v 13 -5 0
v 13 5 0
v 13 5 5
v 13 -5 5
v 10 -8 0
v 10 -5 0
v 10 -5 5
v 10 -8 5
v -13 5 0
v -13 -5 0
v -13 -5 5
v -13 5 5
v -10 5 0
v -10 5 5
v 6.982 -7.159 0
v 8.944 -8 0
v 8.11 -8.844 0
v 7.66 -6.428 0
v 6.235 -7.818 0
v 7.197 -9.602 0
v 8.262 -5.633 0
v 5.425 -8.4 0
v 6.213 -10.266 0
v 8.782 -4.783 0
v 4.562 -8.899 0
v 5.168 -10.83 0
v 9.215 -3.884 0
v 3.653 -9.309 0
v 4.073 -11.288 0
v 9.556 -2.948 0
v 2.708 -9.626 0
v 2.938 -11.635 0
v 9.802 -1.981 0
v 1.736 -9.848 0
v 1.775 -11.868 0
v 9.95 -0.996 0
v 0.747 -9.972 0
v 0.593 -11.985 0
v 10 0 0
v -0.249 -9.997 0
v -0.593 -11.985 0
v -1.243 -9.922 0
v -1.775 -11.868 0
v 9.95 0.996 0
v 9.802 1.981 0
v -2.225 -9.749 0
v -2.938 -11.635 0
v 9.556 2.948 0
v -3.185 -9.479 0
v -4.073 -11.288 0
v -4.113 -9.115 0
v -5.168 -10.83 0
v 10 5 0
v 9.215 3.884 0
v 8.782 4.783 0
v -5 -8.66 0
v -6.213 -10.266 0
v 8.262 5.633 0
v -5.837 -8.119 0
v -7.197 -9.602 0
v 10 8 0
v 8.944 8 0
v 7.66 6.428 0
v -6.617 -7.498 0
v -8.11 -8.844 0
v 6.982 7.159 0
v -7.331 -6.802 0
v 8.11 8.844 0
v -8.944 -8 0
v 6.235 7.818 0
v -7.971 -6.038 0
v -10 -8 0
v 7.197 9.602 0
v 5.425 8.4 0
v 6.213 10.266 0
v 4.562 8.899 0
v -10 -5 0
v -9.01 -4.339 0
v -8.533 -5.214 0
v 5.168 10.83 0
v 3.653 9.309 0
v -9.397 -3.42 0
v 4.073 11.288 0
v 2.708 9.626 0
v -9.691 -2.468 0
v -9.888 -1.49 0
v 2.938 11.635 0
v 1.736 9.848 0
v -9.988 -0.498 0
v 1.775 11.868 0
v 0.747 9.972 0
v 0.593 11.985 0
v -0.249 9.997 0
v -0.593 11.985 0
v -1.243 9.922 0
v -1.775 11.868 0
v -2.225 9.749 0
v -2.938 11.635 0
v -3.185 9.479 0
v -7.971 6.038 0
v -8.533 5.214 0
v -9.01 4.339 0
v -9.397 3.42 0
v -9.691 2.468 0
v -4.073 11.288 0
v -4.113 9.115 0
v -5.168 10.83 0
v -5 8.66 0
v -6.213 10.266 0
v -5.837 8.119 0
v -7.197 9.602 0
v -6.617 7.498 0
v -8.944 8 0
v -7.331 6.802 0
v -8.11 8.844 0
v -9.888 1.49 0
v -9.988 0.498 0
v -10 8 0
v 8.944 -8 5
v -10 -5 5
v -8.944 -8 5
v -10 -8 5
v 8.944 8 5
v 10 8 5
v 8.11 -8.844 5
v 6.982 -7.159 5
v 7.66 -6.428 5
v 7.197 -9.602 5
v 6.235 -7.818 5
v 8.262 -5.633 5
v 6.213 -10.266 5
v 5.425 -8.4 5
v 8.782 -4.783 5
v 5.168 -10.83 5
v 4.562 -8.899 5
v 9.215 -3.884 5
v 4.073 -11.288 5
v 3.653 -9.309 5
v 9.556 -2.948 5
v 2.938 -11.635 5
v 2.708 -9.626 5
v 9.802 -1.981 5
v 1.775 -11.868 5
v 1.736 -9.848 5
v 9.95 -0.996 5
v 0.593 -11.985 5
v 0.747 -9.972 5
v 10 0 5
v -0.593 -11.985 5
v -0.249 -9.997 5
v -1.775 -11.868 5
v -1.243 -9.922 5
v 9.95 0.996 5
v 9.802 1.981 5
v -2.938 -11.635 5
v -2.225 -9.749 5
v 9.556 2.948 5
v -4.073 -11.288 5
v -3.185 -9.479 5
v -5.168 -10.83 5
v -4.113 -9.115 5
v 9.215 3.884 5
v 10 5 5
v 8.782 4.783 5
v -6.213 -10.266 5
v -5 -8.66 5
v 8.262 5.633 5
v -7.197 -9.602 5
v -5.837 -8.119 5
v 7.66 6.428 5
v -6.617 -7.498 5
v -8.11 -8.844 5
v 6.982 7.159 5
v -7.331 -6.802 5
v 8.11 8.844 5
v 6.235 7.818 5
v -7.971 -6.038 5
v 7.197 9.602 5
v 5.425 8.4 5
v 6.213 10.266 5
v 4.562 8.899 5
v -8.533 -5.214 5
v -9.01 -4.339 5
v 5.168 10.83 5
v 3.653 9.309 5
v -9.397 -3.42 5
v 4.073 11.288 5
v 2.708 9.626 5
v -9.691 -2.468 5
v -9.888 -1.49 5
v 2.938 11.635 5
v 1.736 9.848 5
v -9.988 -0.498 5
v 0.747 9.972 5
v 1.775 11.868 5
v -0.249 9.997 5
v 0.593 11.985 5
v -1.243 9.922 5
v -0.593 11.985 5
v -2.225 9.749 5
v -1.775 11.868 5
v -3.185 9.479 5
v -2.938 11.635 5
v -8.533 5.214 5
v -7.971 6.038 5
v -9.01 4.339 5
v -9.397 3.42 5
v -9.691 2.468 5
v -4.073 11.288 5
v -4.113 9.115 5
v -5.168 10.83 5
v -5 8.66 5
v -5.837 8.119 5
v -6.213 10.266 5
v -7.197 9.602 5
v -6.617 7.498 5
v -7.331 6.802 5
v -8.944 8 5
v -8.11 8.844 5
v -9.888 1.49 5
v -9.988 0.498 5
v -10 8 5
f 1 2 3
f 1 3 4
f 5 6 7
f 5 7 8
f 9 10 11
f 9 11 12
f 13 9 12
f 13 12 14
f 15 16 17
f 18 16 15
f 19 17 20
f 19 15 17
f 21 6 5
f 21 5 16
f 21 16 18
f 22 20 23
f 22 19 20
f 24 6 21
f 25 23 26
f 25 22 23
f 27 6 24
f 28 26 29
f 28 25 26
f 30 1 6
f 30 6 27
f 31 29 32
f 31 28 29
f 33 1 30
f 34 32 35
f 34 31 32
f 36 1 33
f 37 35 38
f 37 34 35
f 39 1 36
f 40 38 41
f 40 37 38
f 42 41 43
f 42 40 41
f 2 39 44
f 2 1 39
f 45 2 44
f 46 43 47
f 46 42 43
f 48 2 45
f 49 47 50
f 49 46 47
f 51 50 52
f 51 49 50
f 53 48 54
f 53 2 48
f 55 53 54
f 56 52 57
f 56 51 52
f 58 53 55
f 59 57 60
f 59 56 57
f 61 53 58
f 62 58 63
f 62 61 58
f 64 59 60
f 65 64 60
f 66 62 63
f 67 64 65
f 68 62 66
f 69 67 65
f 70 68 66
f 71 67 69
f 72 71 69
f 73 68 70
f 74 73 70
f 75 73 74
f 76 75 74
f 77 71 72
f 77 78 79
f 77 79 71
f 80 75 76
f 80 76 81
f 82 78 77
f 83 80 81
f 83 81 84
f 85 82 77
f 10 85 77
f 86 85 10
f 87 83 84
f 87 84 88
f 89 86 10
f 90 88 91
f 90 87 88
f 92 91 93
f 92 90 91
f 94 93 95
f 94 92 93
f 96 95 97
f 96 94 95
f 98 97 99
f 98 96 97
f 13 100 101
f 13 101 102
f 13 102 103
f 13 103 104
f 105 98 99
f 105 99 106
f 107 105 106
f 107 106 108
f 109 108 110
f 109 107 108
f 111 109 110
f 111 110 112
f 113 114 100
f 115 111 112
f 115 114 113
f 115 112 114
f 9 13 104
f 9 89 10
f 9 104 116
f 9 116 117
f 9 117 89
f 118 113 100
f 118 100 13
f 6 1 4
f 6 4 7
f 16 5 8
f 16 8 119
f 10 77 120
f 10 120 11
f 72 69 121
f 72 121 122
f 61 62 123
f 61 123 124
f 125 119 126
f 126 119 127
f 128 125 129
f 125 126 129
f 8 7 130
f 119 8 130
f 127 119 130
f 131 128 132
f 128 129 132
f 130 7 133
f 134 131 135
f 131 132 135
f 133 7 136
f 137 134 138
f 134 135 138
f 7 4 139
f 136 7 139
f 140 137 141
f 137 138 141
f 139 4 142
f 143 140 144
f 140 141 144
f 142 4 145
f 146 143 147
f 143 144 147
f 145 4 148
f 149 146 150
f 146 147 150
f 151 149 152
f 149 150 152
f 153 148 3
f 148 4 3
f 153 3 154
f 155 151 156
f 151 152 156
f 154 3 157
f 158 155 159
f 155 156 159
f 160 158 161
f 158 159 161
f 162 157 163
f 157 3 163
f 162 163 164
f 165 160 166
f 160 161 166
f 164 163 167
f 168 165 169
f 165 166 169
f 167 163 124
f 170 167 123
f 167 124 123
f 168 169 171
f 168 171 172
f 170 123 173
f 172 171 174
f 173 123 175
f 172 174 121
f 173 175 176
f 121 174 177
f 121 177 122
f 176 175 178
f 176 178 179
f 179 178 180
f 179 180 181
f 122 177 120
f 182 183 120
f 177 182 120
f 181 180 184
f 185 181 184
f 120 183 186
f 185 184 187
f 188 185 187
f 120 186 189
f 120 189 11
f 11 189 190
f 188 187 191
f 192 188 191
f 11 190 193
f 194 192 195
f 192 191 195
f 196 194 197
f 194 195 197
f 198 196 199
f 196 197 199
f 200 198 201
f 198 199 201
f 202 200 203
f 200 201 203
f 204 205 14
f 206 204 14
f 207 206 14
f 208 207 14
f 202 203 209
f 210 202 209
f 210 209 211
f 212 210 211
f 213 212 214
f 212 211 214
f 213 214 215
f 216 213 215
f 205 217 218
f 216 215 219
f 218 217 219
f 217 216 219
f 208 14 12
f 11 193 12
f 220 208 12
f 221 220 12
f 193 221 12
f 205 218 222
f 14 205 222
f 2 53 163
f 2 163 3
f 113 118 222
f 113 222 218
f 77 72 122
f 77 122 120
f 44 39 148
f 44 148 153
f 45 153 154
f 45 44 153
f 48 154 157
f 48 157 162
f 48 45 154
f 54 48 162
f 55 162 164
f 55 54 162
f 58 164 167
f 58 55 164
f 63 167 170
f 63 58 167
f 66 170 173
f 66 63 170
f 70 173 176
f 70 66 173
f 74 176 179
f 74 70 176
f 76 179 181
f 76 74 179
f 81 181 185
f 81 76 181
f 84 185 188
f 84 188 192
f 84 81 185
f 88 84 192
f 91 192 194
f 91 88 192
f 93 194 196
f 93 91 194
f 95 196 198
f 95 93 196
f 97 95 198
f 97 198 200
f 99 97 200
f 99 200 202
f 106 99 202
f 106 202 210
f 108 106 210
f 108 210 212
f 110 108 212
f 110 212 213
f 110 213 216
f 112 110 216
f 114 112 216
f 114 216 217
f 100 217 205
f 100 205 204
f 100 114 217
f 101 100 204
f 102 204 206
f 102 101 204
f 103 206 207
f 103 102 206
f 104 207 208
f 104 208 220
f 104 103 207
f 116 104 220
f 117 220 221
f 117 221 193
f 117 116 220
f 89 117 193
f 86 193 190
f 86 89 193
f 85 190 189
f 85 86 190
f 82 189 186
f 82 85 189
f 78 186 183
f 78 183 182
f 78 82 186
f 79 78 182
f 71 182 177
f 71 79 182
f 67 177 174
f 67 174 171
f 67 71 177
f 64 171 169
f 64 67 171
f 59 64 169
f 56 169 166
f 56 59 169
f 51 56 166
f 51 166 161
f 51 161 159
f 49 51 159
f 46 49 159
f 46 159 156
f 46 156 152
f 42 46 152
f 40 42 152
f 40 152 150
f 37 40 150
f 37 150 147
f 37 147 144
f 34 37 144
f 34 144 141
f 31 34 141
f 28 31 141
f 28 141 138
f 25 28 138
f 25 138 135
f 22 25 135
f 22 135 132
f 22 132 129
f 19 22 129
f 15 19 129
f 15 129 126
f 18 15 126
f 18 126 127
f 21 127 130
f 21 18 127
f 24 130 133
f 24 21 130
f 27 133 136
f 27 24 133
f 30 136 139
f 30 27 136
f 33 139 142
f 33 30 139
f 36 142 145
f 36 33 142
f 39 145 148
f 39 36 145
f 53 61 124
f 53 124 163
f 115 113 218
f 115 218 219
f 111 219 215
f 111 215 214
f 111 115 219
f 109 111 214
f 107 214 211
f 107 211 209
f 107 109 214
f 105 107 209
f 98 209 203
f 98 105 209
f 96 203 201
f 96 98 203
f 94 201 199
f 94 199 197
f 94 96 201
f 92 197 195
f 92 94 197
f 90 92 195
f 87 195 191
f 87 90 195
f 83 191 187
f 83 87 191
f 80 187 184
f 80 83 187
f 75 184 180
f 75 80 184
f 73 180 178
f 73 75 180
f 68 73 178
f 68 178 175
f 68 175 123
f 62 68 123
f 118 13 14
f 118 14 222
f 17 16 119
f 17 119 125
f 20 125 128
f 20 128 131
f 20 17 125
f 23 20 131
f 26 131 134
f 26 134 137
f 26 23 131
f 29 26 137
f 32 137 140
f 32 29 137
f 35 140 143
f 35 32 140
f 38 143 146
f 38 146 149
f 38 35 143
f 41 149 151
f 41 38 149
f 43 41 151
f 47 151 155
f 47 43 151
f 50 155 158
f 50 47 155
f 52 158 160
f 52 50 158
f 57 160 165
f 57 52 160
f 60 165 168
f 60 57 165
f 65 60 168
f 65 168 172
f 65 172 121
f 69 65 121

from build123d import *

# Parameters (mm, degrees)
SKETCH_1_R      = 10
EXTRUDE_1_DEPTH = 5


with BuildPart() as part:
    # 草图1 → 凸台-拉伸1 (new body)
    with BuildSketch(Plane.XY):
        with BuildLine():
            Line((13, -5), (10, -5))
            Line((10, -5), (10, -8))
            Line((10, -8), (8.94427191, -8))
            ThreePointArc((8.94427191, -8), (0, -12), (-8.94427191, -8))
            Line((-8.94427191, -8), (-10, -8))
            Line((-10, -8), (-10, -5))
            Line((-10, -5), (-13, -5))
            Line((-13, -5), (-13, 5))
            Line((-13, 5), (-10, 5))
            Line((-10, 5), (-10, 8))
            Line((-10, 8), (-8.94427191, 8))
            ThreePointArc((-8.94427191, 8), (0, 12), (8.94427191, 8))
            Line((8.94427191, 8), (10, 8))
            Line((10, 8), (10, 5))
            Line((10, 5), (13, 5))
            Line((13, 5), (13, -5))
        make_face()
        Circle(SKETCH_1_R, mode=Mode.SUBTRACT)
    extrude(amount=EXTRUDE_1_DEPTH)


solid = part.part
